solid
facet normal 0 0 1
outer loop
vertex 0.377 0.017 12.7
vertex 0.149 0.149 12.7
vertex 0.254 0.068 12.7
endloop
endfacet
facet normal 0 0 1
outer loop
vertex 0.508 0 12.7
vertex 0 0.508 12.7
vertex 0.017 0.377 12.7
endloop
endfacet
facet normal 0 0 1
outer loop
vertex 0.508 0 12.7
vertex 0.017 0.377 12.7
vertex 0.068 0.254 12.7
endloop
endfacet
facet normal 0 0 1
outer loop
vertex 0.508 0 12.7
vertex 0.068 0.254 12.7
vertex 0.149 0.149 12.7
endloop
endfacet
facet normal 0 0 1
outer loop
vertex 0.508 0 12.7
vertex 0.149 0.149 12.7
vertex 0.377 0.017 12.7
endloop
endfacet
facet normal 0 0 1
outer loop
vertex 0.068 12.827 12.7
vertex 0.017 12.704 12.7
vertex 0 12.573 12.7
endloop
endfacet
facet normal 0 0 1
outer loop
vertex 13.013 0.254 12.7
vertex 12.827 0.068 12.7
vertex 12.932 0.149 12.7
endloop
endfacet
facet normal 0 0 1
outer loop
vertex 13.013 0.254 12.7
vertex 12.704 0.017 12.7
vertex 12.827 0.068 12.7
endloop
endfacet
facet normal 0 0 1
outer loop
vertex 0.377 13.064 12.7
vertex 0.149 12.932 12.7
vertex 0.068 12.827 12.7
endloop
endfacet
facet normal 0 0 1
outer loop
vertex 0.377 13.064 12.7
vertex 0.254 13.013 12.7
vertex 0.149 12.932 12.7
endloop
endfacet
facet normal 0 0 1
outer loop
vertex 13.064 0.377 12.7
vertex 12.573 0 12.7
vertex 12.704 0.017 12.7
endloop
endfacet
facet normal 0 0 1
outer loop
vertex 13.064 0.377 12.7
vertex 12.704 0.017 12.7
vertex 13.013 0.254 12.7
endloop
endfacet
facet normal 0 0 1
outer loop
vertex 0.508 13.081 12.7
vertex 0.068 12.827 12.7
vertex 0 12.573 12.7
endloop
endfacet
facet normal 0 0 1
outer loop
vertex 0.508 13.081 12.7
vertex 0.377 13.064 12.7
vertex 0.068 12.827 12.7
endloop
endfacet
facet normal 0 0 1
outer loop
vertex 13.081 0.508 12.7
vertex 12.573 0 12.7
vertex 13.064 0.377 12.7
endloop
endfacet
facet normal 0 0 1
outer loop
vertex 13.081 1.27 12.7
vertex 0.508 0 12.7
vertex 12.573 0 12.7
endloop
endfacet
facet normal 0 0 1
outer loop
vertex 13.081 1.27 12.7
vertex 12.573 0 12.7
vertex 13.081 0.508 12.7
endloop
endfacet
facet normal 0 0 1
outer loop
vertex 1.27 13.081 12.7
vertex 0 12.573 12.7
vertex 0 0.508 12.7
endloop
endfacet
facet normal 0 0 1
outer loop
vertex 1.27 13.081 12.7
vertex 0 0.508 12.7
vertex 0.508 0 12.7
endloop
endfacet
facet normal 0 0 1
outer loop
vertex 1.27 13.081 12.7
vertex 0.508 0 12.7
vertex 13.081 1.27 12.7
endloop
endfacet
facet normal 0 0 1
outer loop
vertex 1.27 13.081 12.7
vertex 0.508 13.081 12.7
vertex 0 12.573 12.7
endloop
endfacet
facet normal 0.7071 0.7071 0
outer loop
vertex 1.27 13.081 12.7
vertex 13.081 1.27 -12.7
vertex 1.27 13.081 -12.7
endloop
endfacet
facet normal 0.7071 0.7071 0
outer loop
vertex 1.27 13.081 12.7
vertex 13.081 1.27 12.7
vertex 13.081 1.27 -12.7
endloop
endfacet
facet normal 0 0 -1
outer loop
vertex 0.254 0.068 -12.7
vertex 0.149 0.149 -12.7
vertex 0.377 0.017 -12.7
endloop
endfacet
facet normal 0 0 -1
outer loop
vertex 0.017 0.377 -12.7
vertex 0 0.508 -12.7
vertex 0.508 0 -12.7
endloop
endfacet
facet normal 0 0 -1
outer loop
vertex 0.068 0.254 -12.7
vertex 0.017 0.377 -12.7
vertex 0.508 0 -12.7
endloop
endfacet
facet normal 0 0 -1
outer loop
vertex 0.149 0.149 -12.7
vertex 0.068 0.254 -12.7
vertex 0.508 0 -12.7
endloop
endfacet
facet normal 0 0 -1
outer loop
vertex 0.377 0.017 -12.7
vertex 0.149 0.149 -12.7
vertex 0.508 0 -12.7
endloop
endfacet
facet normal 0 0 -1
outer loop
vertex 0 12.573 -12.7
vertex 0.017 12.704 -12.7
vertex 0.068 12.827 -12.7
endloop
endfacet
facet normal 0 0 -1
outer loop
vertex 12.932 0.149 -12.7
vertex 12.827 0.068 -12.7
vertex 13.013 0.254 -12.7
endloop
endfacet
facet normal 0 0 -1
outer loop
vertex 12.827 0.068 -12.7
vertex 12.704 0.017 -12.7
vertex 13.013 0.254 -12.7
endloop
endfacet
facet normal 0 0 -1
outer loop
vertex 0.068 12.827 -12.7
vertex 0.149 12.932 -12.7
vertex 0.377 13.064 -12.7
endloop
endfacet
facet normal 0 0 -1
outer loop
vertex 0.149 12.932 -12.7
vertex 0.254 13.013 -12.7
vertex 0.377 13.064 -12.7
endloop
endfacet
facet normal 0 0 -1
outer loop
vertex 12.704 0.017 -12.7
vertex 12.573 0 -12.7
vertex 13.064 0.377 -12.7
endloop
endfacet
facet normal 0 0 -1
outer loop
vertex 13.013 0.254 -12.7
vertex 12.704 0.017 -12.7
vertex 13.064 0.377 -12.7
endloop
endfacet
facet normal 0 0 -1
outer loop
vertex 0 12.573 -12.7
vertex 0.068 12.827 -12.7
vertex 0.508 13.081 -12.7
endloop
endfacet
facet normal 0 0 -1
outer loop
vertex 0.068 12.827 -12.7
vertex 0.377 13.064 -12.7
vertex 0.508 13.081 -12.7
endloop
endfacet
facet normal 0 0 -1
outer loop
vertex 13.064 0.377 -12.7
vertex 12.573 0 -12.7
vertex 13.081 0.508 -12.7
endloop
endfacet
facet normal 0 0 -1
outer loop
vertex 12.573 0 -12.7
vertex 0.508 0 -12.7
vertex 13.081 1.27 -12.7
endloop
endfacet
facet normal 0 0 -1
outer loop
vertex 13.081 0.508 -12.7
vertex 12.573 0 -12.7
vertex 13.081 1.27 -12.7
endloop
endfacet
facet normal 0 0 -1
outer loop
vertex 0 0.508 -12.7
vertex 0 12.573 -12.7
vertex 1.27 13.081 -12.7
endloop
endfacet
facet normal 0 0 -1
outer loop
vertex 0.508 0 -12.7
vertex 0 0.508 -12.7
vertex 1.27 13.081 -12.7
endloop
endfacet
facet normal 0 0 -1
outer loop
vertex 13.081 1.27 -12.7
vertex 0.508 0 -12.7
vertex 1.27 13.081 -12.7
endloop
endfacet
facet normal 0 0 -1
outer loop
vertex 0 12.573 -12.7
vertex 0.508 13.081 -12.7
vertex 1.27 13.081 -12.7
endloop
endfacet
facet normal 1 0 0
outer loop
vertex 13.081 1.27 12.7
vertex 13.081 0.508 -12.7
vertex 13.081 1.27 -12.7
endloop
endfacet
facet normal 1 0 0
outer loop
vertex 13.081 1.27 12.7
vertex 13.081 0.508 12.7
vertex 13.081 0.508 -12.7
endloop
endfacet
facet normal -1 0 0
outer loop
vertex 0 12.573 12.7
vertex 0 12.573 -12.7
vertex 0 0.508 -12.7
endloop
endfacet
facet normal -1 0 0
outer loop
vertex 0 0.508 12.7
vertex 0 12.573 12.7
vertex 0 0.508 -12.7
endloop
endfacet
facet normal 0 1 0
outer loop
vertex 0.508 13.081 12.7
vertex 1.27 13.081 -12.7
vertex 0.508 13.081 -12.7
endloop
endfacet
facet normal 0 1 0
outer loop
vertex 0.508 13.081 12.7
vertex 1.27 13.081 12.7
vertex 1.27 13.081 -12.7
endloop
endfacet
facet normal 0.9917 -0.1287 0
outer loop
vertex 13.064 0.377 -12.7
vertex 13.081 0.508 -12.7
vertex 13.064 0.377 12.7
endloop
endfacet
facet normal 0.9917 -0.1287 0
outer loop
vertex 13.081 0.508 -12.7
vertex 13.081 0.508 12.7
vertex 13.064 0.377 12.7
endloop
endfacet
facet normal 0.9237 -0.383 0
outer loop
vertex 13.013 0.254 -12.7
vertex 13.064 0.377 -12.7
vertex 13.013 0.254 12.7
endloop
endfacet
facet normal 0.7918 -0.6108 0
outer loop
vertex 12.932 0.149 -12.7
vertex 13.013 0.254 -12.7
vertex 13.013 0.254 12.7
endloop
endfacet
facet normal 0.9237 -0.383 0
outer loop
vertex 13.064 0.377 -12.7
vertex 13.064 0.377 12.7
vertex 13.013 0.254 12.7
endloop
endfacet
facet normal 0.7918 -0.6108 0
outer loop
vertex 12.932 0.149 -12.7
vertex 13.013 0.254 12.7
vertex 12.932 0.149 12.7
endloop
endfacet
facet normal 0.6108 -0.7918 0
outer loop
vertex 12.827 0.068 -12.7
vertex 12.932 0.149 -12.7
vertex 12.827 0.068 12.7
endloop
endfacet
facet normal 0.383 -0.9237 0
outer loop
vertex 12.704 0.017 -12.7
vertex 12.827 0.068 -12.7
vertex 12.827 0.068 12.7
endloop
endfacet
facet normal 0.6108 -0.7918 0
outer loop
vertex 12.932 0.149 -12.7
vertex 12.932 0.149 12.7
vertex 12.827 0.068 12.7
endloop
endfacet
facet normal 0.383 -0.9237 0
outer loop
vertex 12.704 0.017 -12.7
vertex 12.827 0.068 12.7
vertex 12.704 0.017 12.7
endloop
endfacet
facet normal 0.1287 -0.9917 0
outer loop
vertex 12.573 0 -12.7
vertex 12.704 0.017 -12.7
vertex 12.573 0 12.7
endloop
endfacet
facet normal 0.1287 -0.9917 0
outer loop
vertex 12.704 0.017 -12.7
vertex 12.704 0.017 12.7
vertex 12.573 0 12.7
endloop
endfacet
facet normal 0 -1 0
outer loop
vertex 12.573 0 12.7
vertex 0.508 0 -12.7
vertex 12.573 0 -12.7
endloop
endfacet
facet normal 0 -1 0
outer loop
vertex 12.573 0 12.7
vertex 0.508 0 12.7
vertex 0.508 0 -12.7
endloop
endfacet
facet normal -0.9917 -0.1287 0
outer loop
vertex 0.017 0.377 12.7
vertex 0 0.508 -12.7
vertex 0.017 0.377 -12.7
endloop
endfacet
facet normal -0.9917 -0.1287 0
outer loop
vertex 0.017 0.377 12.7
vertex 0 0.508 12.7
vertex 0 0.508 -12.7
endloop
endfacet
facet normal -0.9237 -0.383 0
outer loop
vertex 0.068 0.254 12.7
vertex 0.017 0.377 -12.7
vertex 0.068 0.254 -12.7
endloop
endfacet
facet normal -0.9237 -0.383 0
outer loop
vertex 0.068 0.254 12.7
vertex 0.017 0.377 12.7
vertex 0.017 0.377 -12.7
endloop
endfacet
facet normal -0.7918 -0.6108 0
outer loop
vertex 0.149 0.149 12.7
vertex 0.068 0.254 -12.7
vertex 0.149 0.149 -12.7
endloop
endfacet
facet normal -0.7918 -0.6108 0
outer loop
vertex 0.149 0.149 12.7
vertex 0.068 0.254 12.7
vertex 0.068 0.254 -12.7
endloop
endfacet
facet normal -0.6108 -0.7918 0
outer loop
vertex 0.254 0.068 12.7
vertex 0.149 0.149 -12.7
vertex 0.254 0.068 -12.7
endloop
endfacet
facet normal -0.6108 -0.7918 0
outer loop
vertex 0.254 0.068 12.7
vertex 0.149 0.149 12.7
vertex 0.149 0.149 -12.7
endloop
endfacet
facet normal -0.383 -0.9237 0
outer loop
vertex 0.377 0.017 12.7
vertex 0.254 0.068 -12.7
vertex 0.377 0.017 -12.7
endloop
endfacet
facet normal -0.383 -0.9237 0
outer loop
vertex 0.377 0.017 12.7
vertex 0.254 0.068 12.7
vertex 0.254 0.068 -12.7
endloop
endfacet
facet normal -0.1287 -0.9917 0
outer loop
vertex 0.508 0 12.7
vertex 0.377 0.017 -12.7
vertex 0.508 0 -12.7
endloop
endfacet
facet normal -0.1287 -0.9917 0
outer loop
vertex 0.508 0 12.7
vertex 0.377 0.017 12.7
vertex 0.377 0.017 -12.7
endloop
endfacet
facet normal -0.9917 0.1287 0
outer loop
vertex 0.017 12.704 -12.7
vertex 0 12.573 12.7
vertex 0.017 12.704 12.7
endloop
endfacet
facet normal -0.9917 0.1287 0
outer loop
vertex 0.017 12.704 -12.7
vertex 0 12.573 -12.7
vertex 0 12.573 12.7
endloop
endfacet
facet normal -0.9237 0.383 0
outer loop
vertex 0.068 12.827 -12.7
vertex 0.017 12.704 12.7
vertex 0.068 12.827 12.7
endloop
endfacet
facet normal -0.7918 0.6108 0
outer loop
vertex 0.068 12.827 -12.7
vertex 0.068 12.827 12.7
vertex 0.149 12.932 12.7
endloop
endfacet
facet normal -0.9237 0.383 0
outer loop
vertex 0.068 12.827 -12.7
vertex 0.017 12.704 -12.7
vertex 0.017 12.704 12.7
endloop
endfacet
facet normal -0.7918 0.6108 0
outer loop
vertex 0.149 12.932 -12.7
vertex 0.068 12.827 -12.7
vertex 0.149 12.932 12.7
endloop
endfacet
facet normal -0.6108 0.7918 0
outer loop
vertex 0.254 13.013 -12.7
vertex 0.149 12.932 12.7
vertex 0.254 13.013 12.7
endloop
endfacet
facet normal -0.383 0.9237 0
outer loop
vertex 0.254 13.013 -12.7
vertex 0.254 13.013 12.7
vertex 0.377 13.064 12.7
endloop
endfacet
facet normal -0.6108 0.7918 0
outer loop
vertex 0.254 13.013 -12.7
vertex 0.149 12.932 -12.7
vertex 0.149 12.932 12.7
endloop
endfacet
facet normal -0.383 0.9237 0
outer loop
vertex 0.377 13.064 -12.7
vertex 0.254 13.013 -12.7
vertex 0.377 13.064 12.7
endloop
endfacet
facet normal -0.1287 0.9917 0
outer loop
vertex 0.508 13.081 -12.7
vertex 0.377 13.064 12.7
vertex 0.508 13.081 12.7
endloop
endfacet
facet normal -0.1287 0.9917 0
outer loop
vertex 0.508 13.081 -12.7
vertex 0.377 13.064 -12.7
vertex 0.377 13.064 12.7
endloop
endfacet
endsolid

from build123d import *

# Parameters (mm, degrees)
EXTRUDE1_DEPTH = 12.7
FILLET1_R      = 0.508


with BuildPart() as part:
    # Sketch1 → Extrude1 (new body, symmetric)
    with BuildSketch(Plane.XY):
        Polygon((0, 13.081), (0, 0), (13.081, 0), (13.081, 1.27), (1.27, 13.081), align=None)
    extrude(amount=EXTRUDE1_DEPTH, both=True)

    # Fillet1
    fillet1_edges = [part.edges().sort_by_distance(p)[0] for p in [
        (13.081, 0, 0),
        (0, 0, 0),
        (0, 13.081, 0),
    ]]
    fillet(fillet1_edges, radius=FILLET1_R)


solid = part.part
